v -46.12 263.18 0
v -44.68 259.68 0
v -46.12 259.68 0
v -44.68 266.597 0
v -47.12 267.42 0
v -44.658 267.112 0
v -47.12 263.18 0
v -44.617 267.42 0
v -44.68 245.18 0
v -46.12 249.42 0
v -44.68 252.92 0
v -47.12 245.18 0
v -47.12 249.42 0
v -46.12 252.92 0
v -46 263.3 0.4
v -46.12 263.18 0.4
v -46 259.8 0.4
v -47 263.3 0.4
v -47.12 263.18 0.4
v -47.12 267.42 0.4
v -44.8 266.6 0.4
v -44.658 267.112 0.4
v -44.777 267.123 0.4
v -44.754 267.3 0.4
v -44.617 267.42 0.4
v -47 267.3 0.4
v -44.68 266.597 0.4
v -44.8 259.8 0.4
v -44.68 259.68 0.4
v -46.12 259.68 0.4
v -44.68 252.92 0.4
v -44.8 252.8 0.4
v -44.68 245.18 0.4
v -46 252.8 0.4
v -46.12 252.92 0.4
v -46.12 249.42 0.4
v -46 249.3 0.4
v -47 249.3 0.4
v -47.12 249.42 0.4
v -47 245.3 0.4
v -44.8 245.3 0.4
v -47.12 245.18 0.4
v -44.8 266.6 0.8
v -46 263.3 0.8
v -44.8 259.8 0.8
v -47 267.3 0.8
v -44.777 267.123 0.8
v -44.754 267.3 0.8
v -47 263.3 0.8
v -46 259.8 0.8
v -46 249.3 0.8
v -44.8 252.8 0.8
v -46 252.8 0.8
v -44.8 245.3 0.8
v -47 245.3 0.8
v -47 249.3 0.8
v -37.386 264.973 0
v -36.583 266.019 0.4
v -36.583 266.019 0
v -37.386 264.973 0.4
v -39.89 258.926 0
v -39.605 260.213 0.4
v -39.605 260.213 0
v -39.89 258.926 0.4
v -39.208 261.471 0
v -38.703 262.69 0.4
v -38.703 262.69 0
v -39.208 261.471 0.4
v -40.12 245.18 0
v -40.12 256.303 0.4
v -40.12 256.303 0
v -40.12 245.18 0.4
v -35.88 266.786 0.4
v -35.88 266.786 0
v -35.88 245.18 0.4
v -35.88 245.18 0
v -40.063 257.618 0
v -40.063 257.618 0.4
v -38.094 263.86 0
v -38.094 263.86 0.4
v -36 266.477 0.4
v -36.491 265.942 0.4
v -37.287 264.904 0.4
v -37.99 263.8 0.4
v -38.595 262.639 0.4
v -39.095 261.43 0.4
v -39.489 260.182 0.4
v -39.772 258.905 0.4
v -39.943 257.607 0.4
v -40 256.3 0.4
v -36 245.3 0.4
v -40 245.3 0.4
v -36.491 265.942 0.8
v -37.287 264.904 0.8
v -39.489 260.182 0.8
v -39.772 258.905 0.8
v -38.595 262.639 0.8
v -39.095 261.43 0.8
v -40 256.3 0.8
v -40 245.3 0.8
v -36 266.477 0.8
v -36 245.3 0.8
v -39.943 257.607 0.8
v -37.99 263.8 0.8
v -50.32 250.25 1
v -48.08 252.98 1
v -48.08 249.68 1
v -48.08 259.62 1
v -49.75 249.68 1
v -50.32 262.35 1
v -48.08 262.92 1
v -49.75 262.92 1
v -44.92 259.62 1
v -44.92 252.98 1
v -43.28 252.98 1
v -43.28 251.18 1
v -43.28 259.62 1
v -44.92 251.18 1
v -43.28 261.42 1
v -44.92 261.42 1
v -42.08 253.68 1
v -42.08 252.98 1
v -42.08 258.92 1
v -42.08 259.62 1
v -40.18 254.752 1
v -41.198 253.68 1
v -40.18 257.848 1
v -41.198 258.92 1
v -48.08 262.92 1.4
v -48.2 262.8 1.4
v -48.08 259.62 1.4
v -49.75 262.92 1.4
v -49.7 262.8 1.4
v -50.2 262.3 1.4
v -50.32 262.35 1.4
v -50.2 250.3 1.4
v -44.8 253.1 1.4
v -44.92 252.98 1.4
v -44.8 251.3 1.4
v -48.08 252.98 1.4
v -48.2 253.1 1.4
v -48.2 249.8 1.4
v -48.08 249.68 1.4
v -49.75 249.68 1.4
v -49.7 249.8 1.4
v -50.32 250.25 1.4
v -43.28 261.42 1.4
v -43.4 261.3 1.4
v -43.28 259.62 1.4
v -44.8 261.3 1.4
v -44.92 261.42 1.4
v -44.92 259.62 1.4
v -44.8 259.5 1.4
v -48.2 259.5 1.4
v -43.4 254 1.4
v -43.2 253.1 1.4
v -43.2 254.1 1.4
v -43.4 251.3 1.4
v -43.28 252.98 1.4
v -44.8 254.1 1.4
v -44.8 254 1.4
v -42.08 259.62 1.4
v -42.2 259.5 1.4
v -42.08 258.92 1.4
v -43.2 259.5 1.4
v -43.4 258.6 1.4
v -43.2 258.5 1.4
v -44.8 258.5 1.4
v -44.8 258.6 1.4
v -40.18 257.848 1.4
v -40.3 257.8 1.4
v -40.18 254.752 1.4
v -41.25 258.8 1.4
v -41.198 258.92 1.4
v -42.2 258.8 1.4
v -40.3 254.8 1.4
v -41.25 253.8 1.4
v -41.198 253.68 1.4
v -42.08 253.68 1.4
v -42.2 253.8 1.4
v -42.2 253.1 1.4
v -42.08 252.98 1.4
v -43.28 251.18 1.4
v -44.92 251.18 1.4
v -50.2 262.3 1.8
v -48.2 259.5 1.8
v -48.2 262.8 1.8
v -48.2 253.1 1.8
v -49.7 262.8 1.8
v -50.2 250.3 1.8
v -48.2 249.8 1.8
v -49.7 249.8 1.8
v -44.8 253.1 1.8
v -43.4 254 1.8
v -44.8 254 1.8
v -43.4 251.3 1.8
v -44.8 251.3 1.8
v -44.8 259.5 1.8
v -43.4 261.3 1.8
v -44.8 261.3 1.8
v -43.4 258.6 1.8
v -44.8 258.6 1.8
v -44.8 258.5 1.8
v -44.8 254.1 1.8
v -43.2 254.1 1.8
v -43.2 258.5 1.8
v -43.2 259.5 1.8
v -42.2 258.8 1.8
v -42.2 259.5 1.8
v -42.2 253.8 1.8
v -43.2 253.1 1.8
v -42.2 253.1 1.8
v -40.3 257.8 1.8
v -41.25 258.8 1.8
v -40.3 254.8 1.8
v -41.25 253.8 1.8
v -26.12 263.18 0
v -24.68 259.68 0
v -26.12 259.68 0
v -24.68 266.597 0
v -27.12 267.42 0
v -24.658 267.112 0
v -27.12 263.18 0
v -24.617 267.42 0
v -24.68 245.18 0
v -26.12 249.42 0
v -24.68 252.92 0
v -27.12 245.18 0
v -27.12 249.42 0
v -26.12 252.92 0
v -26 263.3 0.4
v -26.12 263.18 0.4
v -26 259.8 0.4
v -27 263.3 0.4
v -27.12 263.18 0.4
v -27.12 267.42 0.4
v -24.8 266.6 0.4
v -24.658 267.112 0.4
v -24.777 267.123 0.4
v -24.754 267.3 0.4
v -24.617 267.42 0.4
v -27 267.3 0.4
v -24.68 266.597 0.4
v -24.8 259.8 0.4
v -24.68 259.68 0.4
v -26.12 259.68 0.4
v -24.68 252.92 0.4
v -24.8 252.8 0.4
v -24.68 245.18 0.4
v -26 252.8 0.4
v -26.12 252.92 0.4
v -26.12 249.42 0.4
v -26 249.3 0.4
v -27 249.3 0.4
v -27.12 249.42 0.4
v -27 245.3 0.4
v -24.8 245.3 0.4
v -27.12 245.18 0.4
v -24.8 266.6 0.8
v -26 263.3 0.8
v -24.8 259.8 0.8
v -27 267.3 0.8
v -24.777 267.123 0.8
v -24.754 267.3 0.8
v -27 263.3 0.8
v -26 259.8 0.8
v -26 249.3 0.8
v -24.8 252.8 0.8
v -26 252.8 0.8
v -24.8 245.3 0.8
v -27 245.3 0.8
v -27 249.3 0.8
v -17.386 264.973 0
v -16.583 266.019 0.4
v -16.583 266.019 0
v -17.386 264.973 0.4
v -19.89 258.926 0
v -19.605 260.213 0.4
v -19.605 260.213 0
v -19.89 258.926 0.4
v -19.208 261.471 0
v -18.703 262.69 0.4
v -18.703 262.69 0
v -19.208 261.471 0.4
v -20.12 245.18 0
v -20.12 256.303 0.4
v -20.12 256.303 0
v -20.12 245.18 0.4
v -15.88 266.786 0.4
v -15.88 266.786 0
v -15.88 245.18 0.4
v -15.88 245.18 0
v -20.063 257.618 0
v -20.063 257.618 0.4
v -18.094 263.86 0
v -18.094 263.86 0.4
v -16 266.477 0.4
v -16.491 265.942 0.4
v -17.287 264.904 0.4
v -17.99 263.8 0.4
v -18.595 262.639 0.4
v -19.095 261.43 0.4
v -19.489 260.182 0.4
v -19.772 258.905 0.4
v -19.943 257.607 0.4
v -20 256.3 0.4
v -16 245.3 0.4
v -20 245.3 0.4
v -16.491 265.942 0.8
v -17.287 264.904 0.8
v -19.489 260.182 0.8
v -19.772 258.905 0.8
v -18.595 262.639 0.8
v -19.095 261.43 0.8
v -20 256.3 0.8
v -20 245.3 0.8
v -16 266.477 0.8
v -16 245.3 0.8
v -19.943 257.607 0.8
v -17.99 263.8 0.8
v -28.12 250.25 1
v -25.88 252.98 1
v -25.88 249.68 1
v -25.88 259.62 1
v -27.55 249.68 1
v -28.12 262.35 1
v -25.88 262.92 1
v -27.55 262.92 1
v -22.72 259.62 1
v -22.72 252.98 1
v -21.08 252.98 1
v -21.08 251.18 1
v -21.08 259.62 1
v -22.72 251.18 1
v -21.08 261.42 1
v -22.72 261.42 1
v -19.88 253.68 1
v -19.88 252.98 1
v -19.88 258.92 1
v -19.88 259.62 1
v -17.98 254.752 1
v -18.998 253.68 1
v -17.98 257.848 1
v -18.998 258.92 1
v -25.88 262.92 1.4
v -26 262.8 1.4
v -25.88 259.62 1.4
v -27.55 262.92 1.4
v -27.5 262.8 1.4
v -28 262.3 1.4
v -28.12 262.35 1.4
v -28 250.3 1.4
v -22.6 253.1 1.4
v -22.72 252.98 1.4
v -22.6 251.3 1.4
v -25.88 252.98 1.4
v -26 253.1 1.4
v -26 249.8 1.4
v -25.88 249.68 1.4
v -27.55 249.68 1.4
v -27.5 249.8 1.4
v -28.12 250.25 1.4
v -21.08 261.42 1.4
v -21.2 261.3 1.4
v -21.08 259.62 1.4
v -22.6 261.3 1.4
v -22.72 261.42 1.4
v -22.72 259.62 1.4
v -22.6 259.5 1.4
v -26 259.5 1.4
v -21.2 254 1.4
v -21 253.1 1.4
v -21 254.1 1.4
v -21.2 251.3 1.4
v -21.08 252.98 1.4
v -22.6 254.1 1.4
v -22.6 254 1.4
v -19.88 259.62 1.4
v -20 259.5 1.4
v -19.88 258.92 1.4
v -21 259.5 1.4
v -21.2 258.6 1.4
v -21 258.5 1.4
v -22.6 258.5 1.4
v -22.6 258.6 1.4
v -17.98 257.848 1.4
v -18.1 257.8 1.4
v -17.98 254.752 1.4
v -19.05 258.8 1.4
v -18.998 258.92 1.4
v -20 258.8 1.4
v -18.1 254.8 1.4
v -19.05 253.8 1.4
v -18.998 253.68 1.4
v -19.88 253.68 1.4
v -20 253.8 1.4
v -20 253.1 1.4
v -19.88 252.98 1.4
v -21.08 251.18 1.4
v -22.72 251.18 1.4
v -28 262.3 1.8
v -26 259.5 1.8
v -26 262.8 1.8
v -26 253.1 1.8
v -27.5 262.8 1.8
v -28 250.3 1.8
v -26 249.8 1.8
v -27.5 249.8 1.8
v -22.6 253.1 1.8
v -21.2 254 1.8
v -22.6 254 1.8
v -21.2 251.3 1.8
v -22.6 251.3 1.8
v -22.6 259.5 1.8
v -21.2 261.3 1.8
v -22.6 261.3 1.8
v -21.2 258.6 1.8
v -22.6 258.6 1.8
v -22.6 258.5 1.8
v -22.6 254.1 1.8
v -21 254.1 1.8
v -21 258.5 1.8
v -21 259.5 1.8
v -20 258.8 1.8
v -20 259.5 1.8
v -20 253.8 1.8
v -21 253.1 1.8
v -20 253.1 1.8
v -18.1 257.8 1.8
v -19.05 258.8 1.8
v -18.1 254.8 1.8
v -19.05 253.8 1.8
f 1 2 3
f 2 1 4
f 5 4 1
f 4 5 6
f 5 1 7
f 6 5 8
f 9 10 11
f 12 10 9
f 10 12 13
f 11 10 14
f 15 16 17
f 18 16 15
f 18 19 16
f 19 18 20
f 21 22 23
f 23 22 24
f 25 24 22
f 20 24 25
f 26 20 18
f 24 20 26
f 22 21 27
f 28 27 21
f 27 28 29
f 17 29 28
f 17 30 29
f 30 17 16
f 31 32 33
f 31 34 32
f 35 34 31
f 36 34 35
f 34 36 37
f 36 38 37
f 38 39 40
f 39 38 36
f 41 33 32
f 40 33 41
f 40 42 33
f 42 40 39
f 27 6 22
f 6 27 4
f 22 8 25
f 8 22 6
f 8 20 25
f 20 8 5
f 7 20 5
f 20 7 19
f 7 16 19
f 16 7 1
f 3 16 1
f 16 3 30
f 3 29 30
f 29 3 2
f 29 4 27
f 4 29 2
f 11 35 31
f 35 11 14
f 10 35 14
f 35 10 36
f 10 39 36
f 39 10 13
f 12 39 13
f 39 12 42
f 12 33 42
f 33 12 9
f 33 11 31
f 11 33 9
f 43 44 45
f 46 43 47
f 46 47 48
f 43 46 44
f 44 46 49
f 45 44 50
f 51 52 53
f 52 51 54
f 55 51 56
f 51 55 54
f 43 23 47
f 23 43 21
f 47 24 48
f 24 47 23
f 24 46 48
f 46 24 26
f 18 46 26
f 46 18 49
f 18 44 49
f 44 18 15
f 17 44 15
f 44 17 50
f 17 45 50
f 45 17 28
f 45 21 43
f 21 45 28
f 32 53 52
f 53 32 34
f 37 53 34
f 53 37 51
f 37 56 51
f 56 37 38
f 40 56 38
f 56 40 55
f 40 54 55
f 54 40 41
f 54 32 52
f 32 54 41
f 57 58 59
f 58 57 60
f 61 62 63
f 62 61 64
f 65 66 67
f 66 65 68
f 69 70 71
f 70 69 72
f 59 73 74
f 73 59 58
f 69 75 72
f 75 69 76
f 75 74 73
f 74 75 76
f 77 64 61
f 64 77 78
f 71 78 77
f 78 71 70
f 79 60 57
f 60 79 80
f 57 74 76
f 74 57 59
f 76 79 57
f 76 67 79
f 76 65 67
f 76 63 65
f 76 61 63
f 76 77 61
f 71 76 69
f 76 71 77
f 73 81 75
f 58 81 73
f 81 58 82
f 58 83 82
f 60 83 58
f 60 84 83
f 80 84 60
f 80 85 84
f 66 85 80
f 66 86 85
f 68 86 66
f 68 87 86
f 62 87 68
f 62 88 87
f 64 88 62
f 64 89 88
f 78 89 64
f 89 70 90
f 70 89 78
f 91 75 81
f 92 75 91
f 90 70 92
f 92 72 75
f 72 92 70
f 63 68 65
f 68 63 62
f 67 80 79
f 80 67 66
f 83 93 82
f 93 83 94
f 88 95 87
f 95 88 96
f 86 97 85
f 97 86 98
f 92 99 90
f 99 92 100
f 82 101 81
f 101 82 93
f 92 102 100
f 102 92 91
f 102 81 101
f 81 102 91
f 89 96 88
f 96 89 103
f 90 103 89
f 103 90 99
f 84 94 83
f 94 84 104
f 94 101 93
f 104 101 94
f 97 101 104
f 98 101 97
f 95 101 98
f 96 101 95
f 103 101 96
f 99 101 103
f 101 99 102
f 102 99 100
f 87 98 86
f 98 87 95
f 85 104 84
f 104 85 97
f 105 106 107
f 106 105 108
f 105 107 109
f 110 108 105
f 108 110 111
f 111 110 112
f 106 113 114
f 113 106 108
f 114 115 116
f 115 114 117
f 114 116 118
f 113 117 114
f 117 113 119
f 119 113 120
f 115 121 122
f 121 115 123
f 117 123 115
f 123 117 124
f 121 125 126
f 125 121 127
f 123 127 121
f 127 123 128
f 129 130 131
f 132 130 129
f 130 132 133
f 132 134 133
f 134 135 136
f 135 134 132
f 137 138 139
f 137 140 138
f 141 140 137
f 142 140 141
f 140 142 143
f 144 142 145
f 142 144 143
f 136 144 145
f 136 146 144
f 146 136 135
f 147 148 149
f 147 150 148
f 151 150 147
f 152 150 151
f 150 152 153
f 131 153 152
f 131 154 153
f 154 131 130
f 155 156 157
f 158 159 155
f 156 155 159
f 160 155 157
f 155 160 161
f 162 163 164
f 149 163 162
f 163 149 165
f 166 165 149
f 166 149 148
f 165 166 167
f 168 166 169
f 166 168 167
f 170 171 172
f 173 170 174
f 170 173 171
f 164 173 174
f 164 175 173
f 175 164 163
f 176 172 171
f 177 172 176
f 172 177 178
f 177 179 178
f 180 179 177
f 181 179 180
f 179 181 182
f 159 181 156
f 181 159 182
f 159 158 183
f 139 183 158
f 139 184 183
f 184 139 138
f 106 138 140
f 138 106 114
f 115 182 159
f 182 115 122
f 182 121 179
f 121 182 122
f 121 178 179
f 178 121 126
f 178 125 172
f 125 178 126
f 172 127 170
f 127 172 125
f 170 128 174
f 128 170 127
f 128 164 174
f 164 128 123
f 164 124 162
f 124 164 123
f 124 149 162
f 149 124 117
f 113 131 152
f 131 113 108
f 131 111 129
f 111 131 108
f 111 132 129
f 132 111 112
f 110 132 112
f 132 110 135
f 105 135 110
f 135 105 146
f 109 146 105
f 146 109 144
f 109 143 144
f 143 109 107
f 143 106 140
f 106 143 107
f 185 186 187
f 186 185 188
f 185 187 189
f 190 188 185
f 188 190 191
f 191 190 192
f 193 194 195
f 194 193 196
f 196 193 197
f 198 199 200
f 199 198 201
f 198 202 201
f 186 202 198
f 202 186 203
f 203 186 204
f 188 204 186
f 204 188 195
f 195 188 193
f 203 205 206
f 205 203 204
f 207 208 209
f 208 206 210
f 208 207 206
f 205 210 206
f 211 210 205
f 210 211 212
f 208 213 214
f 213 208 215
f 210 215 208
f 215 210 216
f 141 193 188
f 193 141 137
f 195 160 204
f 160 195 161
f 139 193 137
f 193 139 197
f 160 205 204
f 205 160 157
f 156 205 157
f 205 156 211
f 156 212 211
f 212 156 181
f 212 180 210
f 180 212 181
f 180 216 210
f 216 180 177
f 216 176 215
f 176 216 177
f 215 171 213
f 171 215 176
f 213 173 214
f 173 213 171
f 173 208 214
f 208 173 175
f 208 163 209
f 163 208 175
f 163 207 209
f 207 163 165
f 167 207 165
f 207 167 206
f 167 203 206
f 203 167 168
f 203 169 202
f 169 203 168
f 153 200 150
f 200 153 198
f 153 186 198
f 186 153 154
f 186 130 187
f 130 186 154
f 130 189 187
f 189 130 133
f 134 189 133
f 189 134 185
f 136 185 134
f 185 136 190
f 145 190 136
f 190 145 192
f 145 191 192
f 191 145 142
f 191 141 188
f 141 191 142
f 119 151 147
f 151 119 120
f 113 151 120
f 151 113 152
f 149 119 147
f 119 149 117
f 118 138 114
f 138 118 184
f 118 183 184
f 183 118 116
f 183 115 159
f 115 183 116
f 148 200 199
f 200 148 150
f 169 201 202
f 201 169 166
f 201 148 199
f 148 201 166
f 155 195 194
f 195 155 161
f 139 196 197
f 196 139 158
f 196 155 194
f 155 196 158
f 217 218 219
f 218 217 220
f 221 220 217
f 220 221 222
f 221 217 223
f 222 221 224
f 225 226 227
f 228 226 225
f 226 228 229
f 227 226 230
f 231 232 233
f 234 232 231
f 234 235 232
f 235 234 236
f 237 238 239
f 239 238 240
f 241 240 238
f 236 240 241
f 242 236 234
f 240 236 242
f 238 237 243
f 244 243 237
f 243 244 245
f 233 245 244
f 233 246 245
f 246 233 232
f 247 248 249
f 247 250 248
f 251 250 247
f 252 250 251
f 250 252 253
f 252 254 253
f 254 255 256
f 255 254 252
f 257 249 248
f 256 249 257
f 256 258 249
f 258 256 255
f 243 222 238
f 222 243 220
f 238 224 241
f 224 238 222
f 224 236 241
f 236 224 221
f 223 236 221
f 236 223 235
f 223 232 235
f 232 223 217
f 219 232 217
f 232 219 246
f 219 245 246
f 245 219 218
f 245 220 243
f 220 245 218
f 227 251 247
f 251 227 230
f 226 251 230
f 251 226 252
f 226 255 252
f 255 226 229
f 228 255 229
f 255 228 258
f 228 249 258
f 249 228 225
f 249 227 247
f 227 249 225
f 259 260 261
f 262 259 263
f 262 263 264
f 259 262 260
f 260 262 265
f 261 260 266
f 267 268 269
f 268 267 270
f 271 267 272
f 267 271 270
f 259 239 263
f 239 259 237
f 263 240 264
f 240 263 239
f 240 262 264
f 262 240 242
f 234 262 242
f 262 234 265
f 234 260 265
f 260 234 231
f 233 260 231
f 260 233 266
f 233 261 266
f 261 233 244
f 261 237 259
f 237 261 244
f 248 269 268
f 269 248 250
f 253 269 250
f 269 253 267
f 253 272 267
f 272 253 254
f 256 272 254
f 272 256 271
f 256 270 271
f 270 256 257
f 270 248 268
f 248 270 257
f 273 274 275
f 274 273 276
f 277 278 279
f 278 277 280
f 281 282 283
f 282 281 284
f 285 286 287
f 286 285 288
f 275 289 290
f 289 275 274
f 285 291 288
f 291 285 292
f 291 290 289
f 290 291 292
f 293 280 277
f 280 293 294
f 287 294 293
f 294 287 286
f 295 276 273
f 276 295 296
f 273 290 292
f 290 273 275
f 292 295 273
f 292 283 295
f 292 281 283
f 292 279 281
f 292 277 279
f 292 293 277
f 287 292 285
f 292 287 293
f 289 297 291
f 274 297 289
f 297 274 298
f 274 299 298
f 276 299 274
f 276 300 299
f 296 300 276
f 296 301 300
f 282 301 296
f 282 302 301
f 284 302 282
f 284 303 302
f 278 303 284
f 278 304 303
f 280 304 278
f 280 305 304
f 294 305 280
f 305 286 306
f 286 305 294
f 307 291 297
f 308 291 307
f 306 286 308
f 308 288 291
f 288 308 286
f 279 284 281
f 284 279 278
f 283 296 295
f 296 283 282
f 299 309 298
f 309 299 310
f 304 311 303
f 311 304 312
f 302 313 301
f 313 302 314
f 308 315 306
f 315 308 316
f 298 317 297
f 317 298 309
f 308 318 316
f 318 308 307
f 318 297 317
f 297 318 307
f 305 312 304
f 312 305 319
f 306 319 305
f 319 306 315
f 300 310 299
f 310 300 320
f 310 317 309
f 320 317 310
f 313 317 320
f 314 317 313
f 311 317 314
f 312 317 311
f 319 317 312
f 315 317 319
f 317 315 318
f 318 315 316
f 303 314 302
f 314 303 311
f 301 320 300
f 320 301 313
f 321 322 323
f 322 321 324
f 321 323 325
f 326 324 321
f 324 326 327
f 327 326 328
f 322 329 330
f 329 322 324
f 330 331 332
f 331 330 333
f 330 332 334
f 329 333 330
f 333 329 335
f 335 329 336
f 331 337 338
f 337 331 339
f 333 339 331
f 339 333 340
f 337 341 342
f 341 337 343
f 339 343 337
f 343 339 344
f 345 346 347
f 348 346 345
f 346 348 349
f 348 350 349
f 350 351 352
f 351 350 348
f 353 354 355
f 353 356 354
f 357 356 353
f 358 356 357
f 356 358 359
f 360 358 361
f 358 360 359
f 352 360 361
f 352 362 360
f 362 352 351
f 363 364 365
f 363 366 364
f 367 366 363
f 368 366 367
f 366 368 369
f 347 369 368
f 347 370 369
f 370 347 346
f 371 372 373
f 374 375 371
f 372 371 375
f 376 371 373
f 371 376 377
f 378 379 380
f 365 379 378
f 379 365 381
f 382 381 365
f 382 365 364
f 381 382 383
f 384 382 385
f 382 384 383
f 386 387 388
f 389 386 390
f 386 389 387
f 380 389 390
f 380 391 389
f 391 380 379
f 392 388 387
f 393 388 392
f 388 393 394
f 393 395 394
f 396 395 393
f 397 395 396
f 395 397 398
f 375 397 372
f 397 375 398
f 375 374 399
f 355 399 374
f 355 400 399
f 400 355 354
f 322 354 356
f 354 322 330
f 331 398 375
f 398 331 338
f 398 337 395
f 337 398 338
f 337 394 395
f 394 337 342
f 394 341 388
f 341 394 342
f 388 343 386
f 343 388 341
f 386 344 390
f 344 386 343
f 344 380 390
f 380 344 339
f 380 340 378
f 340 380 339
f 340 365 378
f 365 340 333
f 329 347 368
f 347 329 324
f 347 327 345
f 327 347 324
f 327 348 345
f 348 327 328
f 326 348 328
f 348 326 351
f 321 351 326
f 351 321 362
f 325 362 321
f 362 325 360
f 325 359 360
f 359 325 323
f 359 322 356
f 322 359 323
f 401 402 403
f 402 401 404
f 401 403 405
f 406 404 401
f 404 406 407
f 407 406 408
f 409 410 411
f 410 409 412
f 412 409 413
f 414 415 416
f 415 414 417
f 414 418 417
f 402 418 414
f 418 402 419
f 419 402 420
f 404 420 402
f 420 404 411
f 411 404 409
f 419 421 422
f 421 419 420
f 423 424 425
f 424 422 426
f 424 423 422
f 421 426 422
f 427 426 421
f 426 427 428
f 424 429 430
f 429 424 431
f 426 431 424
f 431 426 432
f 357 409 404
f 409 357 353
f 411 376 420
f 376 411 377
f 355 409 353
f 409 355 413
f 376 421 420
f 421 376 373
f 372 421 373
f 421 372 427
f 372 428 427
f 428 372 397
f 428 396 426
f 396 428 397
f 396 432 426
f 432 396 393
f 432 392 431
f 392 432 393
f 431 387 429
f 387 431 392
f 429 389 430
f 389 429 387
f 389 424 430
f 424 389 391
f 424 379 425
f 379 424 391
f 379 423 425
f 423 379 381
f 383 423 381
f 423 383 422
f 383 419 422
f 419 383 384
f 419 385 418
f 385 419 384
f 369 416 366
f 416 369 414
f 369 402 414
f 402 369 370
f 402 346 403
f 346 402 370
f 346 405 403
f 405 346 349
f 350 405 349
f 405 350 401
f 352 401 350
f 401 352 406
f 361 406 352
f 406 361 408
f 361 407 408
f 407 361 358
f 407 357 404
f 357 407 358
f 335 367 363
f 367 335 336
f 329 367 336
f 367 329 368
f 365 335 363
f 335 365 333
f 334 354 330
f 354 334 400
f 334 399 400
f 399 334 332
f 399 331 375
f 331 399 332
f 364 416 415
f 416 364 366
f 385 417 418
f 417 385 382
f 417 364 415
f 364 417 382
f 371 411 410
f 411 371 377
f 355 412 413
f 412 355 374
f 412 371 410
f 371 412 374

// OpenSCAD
// A bal oldali hosszabbított bekapcsológomb metszete a gomb tengelyén (t = t_btn sík), nyugalomban és végig benyomva
PART_OVERRIDE = "none";
include <../terminal.scad>
RED = [0.90, 0.25, 0.15]; TEAL = [0.38, 0.75, 0.77]; GREY = [0.80, 0.80, 0.80]; DARK = [0.25, 0.25, 0.27];
module sect() projection(cut = true) translate([0, 0, -t_btn]) children();
module draw(col, z) { color("black") translate([0,0,z]) linear_extrude(0.4) offset(delta = 0.12) children(); color(col) translate([0,0,z+0.4]) linear_extrude(0.4) children(); }
module win() intersection() { children(); translate([-52, s_btn - 11]) square([16, 22]); }
module panel(dx, press, title) translate([dx, 0, 0]) {
    draw(TEAL, 0) win() sect() top();
    draw(GREY, 0) win() sect() printer_dummy();
    draw(RED, 1) win() sect() btn_outer(press);
    draw(DARK, 1) win() sect() btn_inner(press);
}
panel(0, 0, "NYUGALOMBAN");
panel(20, btn_travel, "BENYOMVA (2.2 mm)");
